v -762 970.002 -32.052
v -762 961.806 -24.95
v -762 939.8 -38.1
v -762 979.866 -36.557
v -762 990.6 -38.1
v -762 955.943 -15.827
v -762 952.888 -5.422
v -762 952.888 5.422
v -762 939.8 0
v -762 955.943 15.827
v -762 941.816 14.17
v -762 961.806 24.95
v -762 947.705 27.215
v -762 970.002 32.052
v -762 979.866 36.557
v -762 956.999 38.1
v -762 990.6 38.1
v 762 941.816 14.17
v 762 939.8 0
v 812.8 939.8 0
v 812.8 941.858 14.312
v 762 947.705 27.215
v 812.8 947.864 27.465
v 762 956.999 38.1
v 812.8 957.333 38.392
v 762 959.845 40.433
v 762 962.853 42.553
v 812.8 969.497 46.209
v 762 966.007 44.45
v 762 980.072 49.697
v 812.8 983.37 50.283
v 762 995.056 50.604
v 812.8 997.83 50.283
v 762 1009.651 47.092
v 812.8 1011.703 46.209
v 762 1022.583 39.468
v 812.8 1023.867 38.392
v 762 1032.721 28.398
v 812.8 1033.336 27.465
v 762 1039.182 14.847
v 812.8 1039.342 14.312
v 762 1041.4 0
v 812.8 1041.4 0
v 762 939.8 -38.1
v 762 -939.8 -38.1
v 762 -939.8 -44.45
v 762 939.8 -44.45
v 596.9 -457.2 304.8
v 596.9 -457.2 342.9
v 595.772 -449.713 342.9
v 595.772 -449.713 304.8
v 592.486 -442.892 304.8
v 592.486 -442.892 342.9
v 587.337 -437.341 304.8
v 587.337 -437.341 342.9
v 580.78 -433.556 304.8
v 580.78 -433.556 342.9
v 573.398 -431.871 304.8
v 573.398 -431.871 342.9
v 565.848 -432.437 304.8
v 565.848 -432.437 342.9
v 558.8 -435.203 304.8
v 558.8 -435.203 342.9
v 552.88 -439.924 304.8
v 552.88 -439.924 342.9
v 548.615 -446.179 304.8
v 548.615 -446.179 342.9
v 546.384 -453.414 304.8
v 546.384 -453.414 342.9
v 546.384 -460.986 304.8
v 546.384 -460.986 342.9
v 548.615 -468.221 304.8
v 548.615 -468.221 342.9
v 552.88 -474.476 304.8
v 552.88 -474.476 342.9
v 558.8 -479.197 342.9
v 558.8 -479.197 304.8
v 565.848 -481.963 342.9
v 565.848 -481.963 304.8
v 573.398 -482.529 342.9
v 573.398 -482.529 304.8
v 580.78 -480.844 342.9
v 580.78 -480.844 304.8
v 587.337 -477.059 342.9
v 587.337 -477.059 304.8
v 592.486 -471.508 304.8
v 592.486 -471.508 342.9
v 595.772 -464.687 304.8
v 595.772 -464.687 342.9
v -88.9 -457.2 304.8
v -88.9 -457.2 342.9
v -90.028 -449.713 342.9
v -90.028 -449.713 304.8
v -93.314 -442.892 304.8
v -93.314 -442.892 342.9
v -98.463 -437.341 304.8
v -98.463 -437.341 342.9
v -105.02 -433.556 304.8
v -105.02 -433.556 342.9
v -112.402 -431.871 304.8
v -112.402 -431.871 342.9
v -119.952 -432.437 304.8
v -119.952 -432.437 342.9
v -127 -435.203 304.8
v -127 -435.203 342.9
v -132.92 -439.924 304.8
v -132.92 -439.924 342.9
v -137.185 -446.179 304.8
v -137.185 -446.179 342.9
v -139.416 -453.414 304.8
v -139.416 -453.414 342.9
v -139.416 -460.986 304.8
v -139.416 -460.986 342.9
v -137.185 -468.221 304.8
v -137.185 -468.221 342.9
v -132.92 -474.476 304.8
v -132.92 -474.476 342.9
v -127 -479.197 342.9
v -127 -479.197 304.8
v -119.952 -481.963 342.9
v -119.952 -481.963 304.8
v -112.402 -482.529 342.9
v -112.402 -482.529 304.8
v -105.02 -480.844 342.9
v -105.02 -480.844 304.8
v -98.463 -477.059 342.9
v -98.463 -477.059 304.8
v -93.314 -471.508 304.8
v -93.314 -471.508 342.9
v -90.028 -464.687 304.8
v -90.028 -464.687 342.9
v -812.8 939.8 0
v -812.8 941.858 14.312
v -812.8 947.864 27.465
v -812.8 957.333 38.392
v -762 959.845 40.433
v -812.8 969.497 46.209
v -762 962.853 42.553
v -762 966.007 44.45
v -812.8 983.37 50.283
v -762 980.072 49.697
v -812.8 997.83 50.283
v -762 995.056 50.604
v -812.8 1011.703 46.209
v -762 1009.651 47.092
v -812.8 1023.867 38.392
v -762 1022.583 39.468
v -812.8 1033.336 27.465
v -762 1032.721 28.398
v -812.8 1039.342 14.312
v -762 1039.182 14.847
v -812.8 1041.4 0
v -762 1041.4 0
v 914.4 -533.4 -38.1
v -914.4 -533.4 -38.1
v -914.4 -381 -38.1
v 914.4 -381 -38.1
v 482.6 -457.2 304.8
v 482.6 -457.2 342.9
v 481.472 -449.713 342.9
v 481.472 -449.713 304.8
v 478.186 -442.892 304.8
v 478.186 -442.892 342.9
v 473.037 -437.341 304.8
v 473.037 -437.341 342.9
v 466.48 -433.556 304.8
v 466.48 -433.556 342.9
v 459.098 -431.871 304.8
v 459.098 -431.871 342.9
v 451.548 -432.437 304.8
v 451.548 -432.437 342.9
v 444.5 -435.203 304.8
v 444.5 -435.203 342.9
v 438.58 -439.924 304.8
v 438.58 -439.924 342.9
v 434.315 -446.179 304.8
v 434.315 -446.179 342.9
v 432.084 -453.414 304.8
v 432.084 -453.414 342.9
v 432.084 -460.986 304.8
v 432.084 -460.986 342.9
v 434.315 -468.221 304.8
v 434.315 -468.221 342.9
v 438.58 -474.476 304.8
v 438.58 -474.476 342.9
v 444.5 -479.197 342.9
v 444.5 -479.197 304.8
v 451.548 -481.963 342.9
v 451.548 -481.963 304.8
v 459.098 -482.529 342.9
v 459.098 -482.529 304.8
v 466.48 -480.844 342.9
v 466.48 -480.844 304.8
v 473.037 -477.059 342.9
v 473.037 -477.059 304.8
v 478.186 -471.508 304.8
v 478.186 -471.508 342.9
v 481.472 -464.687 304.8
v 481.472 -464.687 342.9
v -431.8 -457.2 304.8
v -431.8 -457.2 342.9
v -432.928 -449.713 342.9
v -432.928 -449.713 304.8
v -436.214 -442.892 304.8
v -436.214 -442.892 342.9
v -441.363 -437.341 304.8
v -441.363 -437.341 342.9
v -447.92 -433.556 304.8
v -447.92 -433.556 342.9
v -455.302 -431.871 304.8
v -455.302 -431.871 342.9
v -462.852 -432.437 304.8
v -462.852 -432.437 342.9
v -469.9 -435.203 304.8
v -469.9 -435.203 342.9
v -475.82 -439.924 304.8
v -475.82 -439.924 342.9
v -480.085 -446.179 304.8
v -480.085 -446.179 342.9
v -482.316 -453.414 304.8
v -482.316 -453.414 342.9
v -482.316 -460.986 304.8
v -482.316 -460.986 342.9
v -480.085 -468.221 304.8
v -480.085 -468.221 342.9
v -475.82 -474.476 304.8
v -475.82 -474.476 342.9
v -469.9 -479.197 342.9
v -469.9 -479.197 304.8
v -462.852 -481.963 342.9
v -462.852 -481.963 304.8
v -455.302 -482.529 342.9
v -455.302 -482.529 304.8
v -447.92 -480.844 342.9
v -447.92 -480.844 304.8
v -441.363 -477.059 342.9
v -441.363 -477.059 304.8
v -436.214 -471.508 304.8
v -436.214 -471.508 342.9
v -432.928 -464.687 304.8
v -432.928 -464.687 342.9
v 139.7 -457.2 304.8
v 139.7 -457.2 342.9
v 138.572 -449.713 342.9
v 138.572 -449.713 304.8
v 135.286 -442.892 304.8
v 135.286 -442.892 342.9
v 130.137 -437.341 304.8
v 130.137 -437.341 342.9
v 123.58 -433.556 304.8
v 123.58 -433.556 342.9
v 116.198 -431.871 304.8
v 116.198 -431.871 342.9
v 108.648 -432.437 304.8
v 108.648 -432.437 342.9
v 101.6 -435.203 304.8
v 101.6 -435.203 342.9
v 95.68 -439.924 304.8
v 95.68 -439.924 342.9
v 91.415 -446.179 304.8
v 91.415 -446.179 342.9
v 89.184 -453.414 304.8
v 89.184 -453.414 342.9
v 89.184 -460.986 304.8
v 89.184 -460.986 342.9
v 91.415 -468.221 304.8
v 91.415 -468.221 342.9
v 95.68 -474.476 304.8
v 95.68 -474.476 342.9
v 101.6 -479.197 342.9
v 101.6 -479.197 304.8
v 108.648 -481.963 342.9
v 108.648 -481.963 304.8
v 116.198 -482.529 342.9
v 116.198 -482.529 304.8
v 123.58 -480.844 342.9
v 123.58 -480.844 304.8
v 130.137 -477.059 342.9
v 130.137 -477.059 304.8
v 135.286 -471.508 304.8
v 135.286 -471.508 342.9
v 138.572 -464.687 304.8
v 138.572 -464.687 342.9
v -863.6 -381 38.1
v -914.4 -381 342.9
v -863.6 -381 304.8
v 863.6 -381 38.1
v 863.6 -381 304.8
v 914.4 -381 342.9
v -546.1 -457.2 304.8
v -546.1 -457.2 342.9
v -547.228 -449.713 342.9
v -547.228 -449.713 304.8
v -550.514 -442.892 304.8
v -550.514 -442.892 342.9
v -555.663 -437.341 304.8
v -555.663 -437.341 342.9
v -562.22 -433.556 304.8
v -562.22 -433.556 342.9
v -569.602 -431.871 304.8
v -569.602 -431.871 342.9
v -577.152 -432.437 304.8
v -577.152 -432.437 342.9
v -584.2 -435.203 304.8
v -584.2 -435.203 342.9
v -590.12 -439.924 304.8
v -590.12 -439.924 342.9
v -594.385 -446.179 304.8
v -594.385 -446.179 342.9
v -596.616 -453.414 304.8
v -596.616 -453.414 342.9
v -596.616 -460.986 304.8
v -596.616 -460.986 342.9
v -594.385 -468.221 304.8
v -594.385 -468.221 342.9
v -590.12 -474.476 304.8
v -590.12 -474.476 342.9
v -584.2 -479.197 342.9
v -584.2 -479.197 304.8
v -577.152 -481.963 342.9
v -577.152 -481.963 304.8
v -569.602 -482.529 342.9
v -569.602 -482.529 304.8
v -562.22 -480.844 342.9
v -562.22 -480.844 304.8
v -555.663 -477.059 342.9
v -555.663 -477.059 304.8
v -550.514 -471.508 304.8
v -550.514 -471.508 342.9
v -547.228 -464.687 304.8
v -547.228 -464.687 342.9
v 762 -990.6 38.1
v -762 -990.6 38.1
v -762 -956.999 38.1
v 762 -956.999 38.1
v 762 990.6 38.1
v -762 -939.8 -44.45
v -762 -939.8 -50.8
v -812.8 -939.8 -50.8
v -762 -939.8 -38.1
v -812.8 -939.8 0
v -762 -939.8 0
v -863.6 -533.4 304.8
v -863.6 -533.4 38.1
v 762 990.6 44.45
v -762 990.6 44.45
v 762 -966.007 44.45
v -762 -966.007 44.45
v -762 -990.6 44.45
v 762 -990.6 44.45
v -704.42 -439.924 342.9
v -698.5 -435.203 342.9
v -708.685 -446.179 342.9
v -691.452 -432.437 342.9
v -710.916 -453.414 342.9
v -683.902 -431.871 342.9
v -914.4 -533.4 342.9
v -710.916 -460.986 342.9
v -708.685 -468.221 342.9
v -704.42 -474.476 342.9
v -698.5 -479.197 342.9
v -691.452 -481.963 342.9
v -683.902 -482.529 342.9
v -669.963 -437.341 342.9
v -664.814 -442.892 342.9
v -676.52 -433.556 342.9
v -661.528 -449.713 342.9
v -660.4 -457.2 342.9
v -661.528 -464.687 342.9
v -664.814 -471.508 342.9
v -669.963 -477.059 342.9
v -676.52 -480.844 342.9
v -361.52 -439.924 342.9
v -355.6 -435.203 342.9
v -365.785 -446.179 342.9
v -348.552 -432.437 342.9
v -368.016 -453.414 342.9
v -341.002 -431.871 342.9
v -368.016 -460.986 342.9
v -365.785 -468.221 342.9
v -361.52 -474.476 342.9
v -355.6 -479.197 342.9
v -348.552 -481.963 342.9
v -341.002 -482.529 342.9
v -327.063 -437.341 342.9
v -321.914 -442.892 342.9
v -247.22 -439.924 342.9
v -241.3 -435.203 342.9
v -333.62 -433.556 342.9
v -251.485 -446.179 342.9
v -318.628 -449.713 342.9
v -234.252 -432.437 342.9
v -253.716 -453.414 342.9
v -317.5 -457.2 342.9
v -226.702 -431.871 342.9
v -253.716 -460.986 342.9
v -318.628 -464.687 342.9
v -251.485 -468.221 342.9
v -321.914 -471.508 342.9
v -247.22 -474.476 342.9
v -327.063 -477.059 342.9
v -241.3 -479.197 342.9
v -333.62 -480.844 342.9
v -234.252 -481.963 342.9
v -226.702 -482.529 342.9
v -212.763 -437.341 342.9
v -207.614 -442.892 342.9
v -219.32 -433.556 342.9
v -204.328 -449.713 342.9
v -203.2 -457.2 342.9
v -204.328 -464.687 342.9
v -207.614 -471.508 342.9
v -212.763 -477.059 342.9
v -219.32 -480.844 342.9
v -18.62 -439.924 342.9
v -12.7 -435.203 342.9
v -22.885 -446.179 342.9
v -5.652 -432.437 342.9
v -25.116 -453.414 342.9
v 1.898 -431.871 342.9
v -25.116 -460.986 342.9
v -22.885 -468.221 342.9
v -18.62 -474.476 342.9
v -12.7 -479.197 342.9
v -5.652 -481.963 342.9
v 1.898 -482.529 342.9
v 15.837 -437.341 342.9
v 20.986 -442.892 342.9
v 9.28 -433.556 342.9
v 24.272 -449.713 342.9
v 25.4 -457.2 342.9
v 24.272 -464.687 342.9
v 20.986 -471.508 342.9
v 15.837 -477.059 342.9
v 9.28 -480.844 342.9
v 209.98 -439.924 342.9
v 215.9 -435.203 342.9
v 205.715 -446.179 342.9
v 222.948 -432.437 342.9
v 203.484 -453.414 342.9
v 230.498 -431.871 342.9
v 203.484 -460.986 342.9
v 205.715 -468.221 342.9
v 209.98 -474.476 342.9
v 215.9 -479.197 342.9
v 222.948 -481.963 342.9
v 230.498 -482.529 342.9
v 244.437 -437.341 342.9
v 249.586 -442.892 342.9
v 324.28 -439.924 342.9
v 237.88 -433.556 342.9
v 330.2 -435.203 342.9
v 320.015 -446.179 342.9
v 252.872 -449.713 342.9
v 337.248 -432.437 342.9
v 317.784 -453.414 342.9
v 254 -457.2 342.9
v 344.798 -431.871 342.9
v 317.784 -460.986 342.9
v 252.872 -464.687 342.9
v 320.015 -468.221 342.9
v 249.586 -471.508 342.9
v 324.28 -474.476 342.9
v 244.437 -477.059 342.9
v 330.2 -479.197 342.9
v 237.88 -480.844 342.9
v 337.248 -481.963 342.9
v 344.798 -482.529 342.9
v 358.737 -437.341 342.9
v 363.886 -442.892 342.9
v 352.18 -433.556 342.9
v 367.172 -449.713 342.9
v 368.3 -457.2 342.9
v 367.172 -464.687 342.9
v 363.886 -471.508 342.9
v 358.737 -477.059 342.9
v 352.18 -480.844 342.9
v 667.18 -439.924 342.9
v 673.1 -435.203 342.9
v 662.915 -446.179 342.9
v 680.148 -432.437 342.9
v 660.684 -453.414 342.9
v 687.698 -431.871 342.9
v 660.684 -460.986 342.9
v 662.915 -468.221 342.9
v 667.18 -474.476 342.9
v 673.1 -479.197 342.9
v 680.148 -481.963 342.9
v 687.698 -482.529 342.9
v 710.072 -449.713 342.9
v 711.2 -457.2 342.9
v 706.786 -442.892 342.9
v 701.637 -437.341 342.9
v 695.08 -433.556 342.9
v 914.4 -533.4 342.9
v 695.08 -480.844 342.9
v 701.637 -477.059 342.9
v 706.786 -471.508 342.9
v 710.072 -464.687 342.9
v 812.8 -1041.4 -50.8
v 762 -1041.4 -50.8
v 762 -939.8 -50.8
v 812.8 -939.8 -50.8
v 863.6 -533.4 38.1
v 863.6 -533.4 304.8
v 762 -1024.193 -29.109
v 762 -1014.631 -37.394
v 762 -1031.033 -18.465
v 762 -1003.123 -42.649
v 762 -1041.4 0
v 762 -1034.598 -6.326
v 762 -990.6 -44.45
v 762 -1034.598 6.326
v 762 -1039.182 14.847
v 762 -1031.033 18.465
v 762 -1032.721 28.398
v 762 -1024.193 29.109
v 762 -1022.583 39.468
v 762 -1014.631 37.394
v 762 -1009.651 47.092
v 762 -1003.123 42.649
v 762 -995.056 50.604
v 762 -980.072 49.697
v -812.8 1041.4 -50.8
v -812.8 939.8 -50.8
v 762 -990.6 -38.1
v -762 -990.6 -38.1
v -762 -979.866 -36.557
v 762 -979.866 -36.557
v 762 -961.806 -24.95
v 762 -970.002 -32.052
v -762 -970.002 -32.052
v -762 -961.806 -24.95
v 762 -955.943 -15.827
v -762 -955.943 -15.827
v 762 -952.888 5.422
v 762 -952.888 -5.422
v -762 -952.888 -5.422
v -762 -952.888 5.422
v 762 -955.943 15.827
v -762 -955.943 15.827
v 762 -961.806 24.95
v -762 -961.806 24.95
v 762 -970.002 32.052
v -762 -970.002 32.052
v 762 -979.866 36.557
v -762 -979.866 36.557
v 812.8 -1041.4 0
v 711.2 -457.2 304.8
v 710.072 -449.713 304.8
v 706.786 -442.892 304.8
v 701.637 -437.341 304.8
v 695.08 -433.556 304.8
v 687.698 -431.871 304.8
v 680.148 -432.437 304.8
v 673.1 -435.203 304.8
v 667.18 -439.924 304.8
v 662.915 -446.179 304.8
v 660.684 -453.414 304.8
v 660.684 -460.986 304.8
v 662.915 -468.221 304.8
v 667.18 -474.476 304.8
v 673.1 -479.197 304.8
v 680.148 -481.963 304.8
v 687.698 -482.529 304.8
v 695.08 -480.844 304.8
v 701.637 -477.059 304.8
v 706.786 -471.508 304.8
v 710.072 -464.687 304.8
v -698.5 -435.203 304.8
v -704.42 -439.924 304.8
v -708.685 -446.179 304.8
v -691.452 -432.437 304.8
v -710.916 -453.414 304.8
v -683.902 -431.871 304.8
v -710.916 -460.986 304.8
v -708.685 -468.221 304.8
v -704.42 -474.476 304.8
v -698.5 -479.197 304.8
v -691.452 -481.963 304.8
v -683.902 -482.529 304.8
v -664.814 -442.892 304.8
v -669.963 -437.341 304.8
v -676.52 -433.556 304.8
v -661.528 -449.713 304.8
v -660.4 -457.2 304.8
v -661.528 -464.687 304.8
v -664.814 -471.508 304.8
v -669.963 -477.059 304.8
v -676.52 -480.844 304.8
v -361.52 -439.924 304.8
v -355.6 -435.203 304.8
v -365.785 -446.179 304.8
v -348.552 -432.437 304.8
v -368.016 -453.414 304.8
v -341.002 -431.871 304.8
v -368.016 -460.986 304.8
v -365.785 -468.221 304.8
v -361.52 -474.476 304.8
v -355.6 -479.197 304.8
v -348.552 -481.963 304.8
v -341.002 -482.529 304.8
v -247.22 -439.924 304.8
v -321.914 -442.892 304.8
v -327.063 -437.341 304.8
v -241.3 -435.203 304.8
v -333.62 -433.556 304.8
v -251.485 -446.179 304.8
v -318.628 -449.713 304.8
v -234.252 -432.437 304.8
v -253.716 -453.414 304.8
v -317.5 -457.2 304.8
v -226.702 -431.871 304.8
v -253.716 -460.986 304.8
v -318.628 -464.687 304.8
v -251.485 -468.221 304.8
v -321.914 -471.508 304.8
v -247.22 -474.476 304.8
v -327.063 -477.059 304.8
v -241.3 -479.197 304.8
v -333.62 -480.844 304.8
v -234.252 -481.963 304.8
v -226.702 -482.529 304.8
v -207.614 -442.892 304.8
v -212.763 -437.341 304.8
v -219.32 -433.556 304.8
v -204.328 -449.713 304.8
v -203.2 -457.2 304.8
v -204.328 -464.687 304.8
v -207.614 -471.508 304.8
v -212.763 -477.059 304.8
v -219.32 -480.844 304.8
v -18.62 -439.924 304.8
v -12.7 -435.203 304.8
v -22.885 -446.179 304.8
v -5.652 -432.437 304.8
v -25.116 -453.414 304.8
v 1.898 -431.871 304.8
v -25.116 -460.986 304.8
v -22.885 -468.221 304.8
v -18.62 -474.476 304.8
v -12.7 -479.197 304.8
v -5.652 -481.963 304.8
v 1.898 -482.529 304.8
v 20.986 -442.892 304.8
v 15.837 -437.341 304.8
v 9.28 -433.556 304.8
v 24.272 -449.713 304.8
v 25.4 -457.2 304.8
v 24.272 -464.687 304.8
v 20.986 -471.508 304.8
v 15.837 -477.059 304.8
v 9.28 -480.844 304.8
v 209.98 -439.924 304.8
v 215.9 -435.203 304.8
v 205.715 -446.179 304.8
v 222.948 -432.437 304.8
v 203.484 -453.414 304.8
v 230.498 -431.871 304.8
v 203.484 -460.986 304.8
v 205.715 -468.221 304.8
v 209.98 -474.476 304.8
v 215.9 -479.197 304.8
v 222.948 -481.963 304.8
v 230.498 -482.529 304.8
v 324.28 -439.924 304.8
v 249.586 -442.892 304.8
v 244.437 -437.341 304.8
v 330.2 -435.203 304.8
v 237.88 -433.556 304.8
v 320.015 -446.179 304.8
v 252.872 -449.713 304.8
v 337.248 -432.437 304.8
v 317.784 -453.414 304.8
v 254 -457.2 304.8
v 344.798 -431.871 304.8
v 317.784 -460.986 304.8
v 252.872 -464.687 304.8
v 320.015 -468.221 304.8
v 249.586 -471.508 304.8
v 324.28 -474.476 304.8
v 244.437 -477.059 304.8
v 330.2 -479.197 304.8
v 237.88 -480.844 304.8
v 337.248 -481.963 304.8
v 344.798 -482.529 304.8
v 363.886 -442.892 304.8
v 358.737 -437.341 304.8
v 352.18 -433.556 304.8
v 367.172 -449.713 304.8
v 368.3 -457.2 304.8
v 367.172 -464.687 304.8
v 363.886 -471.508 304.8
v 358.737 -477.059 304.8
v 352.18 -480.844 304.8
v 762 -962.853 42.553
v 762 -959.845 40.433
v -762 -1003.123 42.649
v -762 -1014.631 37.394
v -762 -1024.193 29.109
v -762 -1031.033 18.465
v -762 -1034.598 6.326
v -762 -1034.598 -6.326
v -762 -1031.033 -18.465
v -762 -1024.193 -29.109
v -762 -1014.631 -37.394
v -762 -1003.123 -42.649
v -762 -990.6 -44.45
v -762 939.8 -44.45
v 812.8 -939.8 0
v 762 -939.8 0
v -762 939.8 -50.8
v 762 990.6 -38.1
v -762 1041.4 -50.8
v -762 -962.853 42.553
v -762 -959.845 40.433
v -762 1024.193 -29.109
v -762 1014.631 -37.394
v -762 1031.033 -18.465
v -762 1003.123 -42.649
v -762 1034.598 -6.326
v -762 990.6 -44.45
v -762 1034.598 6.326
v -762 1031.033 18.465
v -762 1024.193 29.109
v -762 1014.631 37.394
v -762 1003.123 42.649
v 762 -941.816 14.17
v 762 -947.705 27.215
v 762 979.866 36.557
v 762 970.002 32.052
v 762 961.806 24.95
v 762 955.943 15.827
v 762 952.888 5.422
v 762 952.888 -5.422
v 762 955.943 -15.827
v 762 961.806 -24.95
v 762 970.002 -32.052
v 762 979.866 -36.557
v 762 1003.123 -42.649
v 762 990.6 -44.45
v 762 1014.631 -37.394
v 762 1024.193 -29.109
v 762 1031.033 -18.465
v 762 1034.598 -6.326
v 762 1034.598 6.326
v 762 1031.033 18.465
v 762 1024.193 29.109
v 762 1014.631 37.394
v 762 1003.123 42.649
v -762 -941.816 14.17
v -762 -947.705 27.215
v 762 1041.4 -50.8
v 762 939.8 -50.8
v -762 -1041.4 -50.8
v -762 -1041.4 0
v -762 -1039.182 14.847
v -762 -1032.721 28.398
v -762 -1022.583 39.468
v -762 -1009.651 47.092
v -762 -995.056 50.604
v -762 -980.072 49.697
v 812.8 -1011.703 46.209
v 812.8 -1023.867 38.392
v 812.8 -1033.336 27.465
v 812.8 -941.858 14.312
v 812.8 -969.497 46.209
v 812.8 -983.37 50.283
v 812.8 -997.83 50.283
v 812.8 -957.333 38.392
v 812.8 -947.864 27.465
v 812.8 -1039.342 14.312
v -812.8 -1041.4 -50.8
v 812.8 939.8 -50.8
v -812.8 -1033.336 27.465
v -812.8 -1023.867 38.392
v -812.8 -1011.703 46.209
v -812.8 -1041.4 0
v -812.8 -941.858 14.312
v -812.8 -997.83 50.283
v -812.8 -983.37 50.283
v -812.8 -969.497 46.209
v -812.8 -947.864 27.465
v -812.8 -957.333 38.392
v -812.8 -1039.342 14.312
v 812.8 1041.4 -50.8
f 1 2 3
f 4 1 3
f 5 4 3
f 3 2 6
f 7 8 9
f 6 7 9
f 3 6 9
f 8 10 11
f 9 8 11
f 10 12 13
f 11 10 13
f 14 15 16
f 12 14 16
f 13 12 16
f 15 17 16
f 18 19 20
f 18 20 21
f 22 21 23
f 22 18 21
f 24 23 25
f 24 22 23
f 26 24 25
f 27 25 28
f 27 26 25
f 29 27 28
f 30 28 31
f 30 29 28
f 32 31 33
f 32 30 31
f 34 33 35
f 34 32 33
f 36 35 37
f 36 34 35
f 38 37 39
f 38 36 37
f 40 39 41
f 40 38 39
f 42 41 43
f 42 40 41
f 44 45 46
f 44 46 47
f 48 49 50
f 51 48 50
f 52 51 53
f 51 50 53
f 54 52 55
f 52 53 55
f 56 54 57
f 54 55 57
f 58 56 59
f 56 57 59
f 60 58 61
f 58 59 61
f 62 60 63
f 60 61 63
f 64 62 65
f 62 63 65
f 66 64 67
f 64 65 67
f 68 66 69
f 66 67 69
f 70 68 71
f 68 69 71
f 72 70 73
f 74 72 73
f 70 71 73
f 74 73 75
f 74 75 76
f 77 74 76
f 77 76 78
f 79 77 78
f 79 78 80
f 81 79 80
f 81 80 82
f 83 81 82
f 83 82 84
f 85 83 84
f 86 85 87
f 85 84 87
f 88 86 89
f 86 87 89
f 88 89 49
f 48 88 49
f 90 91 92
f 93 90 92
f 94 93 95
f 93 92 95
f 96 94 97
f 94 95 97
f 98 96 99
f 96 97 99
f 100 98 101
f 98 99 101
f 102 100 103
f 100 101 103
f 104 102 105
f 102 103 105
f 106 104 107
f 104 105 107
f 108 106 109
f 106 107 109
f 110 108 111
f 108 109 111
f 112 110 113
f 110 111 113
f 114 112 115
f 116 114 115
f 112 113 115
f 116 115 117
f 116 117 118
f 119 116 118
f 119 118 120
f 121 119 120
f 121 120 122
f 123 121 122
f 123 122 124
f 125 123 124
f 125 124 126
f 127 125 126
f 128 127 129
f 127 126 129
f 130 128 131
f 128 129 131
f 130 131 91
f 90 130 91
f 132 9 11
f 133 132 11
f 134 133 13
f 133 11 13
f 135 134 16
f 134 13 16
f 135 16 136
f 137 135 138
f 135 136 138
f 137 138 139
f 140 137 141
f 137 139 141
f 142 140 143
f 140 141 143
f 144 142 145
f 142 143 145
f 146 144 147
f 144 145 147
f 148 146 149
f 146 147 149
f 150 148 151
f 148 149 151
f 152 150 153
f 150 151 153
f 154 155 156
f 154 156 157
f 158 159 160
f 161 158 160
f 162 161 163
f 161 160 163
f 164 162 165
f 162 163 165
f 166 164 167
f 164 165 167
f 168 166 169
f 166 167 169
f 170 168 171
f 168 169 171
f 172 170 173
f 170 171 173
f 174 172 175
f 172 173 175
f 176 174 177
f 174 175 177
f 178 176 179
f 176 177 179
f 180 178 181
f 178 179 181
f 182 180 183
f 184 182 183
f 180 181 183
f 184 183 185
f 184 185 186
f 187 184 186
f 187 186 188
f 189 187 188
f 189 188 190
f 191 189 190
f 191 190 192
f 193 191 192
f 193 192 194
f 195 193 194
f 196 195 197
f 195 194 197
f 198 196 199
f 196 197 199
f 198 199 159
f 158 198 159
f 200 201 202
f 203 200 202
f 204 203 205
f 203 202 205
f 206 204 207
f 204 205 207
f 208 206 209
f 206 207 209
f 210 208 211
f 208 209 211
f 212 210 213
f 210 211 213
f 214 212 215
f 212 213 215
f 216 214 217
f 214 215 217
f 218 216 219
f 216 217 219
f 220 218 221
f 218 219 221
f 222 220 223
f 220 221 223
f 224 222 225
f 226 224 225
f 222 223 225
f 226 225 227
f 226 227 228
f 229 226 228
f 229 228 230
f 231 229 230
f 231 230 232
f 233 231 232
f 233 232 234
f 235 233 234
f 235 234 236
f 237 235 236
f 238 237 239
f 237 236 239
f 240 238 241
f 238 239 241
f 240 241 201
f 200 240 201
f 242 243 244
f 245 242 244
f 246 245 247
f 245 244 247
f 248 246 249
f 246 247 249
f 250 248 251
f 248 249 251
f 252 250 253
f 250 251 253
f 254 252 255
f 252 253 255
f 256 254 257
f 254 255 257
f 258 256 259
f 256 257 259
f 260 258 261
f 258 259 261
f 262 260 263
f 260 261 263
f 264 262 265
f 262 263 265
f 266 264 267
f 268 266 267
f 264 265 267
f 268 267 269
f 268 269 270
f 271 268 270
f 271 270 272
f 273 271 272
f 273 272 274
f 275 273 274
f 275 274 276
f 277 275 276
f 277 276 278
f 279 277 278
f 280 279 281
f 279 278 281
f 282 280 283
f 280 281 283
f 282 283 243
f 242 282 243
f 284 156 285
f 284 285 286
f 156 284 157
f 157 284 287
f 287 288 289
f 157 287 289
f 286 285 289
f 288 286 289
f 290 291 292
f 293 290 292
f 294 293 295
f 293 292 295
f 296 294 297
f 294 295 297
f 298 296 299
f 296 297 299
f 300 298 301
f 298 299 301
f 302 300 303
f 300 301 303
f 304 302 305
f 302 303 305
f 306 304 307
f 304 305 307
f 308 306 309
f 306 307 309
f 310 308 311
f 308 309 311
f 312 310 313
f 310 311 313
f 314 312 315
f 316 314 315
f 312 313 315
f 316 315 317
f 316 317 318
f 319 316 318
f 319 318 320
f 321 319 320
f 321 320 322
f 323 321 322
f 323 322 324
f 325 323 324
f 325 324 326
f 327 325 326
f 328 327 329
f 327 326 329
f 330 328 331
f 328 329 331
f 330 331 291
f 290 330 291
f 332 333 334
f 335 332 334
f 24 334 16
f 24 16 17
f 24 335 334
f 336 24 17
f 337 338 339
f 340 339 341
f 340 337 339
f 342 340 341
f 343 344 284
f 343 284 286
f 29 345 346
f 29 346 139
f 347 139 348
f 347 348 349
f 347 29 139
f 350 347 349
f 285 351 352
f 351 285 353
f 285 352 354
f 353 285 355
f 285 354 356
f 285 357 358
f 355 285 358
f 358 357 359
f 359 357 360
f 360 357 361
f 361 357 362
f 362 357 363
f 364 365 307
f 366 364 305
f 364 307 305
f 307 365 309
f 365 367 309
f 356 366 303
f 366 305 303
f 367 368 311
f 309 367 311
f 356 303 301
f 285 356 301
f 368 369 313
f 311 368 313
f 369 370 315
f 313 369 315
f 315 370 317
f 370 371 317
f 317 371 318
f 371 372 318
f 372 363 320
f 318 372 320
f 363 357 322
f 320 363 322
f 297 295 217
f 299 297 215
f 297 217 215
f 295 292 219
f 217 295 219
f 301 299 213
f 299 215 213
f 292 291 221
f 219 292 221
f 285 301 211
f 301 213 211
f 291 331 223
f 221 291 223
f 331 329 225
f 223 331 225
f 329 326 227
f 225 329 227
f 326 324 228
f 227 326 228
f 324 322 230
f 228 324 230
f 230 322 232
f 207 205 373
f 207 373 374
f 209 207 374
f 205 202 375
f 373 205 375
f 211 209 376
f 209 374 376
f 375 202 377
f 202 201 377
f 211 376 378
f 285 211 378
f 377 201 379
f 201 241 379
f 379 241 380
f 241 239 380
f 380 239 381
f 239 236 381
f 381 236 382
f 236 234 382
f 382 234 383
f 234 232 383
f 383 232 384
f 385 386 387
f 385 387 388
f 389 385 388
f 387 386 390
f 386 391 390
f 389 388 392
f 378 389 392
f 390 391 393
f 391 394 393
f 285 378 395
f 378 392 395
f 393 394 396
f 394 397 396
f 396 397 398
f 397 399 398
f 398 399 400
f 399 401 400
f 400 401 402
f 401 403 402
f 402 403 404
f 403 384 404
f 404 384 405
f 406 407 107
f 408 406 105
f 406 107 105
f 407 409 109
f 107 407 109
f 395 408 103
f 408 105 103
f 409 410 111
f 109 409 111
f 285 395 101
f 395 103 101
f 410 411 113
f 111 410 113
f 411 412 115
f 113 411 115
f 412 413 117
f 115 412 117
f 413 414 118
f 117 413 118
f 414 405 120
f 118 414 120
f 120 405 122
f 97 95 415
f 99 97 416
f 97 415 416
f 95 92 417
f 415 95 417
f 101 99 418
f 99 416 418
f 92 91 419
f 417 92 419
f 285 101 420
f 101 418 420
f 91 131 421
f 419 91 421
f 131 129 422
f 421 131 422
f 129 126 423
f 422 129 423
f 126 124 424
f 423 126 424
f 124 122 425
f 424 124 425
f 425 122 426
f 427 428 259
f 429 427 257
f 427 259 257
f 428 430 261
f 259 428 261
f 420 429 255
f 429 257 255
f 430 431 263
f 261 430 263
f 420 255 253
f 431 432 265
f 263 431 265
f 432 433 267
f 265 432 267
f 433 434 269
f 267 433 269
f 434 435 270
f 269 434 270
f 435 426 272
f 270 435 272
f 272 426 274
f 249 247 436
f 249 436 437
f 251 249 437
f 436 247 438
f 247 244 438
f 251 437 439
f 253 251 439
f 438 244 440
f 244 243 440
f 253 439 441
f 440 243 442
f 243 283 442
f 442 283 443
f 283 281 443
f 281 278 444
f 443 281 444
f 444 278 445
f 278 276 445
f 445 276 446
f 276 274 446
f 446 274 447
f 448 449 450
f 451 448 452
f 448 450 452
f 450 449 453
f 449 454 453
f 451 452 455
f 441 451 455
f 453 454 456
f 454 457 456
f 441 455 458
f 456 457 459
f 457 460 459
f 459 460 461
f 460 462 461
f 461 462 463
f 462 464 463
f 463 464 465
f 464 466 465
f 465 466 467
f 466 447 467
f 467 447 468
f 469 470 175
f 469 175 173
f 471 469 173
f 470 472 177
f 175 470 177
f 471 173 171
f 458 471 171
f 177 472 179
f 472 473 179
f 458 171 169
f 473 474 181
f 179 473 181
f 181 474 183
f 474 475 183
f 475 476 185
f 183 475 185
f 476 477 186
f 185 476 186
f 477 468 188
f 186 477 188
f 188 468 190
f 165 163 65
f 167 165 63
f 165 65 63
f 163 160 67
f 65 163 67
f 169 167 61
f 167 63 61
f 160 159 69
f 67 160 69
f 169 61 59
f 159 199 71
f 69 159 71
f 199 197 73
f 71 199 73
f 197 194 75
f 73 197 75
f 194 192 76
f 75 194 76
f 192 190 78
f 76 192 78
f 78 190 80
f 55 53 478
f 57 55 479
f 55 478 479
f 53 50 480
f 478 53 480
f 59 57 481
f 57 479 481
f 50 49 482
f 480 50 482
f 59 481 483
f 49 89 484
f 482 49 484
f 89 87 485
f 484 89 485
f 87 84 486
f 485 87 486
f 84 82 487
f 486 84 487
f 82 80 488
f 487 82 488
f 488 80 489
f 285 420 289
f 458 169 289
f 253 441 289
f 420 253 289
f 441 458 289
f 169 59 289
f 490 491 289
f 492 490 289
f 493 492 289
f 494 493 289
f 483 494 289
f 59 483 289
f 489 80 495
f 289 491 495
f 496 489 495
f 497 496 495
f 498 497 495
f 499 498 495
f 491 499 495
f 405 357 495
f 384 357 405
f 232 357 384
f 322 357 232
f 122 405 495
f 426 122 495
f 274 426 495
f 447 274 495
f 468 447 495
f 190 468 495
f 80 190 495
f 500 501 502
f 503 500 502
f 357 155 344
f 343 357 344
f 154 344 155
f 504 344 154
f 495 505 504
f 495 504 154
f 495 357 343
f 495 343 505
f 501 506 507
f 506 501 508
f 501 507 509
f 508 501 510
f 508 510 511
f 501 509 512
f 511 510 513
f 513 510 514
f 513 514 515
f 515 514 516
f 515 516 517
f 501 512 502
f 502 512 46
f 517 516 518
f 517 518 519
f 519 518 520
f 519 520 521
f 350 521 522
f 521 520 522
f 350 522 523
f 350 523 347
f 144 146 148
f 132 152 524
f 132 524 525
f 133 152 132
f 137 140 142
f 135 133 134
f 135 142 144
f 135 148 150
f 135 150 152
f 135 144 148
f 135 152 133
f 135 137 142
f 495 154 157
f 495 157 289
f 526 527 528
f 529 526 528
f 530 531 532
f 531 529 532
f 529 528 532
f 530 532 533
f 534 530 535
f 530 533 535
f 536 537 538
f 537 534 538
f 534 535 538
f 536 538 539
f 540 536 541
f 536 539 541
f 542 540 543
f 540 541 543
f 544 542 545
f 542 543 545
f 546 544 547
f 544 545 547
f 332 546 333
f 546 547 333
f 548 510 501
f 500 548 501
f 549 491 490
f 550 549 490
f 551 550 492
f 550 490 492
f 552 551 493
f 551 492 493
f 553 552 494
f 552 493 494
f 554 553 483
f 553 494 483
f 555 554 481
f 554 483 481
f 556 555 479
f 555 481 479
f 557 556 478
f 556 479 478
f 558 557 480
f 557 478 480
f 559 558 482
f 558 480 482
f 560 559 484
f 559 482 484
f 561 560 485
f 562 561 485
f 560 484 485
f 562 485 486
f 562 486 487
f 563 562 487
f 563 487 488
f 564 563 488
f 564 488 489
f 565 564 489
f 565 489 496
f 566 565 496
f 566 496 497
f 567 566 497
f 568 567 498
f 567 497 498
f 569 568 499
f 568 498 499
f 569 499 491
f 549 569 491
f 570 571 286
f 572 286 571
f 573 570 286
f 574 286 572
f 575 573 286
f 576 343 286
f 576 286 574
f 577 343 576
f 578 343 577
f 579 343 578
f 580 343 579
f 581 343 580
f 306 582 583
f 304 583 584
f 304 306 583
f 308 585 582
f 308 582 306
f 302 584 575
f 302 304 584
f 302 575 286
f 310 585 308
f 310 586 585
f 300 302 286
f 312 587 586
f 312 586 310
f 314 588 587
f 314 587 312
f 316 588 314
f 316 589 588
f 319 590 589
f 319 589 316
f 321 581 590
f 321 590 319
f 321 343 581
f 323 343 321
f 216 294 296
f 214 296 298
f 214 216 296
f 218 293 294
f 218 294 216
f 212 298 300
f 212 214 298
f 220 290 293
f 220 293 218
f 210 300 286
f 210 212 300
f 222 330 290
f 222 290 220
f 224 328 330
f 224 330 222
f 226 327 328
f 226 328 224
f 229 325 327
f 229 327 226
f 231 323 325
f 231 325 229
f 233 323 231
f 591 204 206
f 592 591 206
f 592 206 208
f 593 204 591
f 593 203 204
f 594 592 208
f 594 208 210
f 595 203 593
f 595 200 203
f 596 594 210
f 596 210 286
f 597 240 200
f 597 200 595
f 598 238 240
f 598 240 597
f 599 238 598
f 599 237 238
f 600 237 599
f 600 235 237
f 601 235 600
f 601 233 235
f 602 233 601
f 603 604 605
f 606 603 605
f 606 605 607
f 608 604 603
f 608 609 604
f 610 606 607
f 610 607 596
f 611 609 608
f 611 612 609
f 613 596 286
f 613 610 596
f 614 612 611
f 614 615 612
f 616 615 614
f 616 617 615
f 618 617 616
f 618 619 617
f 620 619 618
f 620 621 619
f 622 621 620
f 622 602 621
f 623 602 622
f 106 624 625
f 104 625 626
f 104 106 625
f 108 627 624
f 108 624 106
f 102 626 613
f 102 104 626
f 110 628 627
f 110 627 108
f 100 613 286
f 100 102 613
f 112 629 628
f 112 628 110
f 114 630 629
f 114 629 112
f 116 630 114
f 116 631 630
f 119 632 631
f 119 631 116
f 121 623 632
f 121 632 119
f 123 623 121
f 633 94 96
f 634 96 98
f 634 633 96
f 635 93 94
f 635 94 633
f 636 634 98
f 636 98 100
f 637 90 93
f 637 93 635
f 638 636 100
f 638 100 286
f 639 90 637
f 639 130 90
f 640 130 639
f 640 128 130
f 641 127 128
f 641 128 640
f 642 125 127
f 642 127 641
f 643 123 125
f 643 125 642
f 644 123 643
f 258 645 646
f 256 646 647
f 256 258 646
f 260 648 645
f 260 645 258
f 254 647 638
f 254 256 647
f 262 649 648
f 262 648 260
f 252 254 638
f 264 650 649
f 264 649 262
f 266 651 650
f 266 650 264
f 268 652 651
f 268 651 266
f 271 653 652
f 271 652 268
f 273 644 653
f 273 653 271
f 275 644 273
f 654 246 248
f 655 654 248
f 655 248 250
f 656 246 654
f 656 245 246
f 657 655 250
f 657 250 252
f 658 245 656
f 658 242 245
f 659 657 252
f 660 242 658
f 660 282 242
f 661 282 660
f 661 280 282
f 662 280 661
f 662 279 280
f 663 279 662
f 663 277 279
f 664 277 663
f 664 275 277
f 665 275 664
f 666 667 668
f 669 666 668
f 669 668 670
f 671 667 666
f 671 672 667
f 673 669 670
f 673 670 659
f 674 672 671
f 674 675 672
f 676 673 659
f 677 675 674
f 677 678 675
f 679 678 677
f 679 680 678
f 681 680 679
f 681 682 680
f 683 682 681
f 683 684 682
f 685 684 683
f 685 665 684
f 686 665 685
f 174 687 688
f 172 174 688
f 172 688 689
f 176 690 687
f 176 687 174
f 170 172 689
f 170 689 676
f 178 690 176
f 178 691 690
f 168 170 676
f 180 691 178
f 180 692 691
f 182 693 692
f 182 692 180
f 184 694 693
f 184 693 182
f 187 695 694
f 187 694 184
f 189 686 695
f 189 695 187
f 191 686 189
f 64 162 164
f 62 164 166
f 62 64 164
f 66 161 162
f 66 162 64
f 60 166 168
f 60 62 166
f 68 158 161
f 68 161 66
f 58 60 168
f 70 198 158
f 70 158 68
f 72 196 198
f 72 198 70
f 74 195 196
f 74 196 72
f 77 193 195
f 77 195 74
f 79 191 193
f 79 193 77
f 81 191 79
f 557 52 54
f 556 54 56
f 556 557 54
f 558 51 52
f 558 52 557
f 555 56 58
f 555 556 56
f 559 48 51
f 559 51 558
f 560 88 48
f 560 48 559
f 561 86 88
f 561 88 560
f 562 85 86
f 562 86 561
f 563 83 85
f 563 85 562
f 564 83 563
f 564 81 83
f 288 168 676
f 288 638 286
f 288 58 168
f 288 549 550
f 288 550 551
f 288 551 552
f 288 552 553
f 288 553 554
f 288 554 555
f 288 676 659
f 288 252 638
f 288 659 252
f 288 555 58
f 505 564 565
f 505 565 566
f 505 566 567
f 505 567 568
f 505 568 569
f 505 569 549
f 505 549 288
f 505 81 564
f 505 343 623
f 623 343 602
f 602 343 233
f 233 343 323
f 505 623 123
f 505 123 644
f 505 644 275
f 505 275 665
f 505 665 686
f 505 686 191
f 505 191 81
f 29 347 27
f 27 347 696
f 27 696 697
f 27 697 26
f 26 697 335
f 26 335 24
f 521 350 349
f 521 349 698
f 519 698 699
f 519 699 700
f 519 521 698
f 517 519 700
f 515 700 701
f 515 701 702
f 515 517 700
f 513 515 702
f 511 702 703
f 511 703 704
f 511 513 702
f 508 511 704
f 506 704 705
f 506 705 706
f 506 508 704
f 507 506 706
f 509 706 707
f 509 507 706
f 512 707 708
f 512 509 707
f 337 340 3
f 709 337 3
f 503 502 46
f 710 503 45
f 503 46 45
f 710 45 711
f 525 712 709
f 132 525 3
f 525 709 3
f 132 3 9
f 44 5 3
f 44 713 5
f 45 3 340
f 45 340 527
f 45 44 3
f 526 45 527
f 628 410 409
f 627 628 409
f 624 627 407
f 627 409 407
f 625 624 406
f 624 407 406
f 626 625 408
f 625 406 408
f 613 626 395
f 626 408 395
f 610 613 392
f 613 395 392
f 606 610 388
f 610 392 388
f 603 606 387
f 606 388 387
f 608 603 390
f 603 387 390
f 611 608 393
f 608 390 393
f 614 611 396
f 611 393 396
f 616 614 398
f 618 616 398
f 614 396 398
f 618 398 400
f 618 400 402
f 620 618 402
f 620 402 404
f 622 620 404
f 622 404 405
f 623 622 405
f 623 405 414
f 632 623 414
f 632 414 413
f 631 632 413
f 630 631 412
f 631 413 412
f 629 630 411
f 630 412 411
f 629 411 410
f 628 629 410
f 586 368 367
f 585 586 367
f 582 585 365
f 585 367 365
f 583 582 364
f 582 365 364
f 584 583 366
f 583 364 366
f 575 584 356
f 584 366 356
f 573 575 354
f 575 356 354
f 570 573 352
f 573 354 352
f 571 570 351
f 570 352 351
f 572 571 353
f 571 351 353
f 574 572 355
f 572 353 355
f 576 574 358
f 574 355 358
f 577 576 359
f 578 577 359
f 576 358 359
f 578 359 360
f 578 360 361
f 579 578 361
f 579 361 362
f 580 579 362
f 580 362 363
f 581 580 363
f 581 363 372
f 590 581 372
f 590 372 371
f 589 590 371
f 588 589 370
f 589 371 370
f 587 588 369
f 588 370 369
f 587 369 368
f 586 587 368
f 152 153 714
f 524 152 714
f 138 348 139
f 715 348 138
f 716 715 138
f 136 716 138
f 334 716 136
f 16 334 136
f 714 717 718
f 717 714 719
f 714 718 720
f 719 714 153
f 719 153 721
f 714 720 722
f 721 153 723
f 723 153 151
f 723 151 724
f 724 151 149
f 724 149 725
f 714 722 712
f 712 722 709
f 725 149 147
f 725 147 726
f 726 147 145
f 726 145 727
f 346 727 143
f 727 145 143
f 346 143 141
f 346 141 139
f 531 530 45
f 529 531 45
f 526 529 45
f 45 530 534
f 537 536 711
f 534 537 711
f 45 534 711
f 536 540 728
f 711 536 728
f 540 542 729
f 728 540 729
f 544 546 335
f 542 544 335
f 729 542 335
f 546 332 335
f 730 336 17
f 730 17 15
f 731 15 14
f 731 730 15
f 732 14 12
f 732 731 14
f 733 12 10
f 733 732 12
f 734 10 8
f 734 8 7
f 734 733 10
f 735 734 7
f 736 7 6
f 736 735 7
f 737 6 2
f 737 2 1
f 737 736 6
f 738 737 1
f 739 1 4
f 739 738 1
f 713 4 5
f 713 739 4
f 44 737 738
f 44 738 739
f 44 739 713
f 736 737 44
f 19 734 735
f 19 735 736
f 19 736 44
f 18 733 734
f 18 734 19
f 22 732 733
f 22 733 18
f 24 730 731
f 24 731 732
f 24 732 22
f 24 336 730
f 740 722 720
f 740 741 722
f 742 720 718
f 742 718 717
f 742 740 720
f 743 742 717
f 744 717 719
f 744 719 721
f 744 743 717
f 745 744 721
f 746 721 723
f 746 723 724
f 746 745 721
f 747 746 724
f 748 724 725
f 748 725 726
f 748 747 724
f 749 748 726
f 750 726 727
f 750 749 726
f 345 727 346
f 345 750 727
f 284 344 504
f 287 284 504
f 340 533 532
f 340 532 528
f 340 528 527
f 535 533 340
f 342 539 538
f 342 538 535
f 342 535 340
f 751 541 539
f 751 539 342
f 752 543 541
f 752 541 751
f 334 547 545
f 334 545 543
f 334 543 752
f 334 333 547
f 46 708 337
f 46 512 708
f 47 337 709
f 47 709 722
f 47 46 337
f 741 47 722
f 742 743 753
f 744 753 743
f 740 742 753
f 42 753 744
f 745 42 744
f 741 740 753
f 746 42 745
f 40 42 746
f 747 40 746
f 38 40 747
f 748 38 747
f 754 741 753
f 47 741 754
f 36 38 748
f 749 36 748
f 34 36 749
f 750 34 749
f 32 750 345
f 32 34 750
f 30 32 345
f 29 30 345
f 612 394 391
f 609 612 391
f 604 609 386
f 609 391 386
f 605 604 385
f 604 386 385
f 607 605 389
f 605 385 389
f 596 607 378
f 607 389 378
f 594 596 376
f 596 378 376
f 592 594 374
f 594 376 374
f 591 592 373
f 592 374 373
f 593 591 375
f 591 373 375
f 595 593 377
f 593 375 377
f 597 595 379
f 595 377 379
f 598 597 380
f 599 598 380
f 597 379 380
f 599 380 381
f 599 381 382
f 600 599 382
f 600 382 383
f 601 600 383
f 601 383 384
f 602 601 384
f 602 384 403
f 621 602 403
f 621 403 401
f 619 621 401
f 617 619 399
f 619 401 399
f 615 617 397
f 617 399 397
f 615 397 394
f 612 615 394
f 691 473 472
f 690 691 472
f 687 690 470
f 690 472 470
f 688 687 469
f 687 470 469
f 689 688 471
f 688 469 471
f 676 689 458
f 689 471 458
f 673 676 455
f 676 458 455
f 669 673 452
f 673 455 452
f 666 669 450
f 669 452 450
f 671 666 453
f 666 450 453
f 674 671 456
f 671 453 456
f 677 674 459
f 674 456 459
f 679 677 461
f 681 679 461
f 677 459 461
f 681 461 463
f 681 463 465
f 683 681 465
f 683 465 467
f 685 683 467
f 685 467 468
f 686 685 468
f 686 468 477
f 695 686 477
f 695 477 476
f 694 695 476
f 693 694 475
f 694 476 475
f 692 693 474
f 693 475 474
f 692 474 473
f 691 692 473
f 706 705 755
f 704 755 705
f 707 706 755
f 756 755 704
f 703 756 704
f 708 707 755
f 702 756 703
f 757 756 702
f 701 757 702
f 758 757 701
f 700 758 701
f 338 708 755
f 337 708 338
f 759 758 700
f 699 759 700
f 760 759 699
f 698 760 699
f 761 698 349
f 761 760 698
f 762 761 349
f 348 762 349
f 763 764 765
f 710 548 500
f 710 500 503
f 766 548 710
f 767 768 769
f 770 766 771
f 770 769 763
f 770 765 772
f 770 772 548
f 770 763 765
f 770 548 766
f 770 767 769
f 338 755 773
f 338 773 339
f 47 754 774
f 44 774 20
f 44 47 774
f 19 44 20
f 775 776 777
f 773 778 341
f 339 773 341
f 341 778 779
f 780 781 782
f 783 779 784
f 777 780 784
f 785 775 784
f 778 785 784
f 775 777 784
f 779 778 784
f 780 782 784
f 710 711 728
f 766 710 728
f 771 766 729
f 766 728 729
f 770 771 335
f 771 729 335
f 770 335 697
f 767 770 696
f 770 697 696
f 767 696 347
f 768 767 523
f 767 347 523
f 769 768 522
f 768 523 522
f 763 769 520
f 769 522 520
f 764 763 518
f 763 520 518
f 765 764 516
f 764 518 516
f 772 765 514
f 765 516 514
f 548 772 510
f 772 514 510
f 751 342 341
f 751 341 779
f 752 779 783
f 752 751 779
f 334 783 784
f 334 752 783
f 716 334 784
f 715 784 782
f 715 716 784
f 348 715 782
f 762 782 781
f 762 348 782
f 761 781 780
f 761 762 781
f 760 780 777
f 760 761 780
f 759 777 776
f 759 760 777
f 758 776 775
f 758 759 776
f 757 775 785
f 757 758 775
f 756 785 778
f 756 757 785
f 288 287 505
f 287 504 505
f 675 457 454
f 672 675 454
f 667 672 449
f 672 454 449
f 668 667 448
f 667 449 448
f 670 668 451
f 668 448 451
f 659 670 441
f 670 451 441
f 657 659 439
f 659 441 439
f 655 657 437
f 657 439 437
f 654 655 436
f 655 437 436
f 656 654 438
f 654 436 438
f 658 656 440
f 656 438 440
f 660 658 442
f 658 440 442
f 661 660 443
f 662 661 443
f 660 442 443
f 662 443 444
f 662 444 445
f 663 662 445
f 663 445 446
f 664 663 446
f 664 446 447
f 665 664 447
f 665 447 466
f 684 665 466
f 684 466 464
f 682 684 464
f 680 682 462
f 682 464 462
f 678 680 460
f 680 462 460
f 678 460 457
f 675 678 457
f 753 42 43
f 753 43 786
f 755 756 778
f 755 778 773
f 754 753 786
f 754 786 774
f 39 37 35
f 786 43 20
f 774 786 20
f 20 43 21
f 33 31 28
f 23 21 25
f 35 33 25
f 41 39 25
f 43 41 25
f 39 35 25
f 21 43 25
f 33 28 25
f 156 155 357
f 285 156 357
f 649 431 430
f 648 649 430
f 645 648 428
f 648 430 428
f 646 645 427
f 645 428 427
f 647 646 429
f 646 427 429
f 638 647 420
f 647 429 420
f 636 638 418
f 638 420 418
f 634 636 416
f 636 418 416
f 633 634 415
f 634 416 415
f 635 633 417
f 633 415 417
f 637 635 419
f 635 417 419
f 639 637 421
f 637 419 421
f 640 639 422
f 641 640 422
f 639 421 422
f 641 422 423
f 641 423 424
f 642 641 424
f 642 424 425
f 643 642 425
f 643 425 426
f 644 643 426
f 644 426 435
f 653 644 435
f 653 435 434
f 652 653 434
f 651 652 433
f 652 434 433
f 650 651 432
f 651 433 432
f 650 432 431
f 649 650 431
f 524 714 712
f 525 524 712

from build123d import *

# Parameters (mm, degrees)
F1_DEPTH  = 762
F2_R      = 38.1
F3_DEPTH  = 812.8
F4_R      = 38.1
F5_DEPTH  = 50.8
F9_W      = 1828.8
F9_H      = 381
F9_W_2    = 1727.2
F9_H_2    = 266.7
F10_DEPTH = 76.2
F11_R     = 25.4
F12_DEPTH = 38.1


with BuildPart() as f1:
    # F0 (on Right) → F1 (new body, symmetric)
    with BuildSketch(Plane.YZ):
        with BuildLine():
            ThreePointArc((990.6, -44.45), (1035.05, 0), (990.6, 44.45))
            Line((990.6, 44.45), (-990.6, 44.45))
            ThreePointArc((-990.6, 44.45), (-1035.05, 0), (-990.6, -44.45))
            Line((-990.6, -44.45), (990.6, -44.45))
        make_face()
        with BuildLine():
            Line((-990.6, 38.1), (990.6, 38.1))
            ThreePointArc((990.6, 38.1), (1028.7, 0), (990.6, -38.1))
            Line((990.6, -38.1), (-990.6, -38.1))
            ThreePointArc((-990.6, -38.1), (-1028.7, 0), (-990.6, 38.1))
        make_face(mode=Mode.SUBTRACT)
    extrude(amount=F1_DEPTH, both=True)

    # F2 (on Right) → F3 (join, symmetric)
    with BuildSketch(Plane.YZ):
        with Locations((-990.6, 0)):
            Circle(F2_R)
        with Locations((990.6, 0)):
            Circle(F2_R)
    extrude(amount=F3_DEPTH, both=True)

    # F4 (on face) → F5 (join, through all)
    with BuildSketch(Plane.YZ.offset(762)):
        with BuildLine():
            Line((-939.8, -50.8), (-939.8, 0))
            ThreePointArc((-939.8, 0), (-990.6, 50.8), (-1041.4, 0))
            Line((-1041.4, 0), (-1041.4, -50.8))
            Line((-1041.4, -50.8), (-939.8, -50.8))
        make_face()
        with Locations((-990.6, 0)):
            Circle(F4_R, mode=Mode.SUBTRACT)
    extrude(amount=F5_DEPTH)

    # F6: F1 across plane


with BuildPart() as f1_1:
    add(f1.part)
    add(f1.part.mirror(Plane.YZ))

    # F7: F1 across plane


with BuildPart() as f1_2:
    add(f1_1.part)
    add(f1_1.part.mirror(Plane.XZ))


with BuildPart() as f10:
    # F9 (on offset) → F10 (new body, symmetric)
    with BuildSketch(Plane.XZ.offset(457.2)):
        with Locations((0, 152.4)):
            Rectangle(F9_W, F9_H)
        with Locations((0, 171.45)):
            Rectangle(F9_W_2, F9_H_2, mode=Mode.SUBTRACT)
    extrude(amount=F10_DEPTH, both=True)

    # F11 (on face) → F12 (cut, through all)
    with BuildSketch(Plane.XY.offset(342.9)):
        with Locations((-457.2, -457.2)):
            Circle(F11_R)
        with Locations((0, -457.2)):
            Circle(F11_R)
        with Locations((-342.9, -457.2)):
            Circle(F11_R)
        with Locations((-114.3, -457.2)):
            Circle(F11_R)
        with Locations((-228.6, -457.2)):
            Circle(F11_R)
        with Locations((-571.5, -457.2)):
            Circle(F11_R)
        with Locations((-685.8, -457.2)):
            Circle(F11_R)
        with Locations((114.3, -457.2)):
            Circle(F11_R)
        with Locations((228.6, -457.2)):
            Circle(F11_R)
        with Locations((342.9, -457.2)):
            Circle(F11_R)
        with Locations((457.2, -457.2)):
            Circle(F11_R)
        with Locations((571.5, -457.2)):
            Circle(F11_R)
        with Locations((685.8, -457.2)):
            Circle(F11_R)
    extrude(amount=-F12_DEPTH, mode=Mode.SUBTRACT)


solid = Compound([f1_2.part, f10.part])
